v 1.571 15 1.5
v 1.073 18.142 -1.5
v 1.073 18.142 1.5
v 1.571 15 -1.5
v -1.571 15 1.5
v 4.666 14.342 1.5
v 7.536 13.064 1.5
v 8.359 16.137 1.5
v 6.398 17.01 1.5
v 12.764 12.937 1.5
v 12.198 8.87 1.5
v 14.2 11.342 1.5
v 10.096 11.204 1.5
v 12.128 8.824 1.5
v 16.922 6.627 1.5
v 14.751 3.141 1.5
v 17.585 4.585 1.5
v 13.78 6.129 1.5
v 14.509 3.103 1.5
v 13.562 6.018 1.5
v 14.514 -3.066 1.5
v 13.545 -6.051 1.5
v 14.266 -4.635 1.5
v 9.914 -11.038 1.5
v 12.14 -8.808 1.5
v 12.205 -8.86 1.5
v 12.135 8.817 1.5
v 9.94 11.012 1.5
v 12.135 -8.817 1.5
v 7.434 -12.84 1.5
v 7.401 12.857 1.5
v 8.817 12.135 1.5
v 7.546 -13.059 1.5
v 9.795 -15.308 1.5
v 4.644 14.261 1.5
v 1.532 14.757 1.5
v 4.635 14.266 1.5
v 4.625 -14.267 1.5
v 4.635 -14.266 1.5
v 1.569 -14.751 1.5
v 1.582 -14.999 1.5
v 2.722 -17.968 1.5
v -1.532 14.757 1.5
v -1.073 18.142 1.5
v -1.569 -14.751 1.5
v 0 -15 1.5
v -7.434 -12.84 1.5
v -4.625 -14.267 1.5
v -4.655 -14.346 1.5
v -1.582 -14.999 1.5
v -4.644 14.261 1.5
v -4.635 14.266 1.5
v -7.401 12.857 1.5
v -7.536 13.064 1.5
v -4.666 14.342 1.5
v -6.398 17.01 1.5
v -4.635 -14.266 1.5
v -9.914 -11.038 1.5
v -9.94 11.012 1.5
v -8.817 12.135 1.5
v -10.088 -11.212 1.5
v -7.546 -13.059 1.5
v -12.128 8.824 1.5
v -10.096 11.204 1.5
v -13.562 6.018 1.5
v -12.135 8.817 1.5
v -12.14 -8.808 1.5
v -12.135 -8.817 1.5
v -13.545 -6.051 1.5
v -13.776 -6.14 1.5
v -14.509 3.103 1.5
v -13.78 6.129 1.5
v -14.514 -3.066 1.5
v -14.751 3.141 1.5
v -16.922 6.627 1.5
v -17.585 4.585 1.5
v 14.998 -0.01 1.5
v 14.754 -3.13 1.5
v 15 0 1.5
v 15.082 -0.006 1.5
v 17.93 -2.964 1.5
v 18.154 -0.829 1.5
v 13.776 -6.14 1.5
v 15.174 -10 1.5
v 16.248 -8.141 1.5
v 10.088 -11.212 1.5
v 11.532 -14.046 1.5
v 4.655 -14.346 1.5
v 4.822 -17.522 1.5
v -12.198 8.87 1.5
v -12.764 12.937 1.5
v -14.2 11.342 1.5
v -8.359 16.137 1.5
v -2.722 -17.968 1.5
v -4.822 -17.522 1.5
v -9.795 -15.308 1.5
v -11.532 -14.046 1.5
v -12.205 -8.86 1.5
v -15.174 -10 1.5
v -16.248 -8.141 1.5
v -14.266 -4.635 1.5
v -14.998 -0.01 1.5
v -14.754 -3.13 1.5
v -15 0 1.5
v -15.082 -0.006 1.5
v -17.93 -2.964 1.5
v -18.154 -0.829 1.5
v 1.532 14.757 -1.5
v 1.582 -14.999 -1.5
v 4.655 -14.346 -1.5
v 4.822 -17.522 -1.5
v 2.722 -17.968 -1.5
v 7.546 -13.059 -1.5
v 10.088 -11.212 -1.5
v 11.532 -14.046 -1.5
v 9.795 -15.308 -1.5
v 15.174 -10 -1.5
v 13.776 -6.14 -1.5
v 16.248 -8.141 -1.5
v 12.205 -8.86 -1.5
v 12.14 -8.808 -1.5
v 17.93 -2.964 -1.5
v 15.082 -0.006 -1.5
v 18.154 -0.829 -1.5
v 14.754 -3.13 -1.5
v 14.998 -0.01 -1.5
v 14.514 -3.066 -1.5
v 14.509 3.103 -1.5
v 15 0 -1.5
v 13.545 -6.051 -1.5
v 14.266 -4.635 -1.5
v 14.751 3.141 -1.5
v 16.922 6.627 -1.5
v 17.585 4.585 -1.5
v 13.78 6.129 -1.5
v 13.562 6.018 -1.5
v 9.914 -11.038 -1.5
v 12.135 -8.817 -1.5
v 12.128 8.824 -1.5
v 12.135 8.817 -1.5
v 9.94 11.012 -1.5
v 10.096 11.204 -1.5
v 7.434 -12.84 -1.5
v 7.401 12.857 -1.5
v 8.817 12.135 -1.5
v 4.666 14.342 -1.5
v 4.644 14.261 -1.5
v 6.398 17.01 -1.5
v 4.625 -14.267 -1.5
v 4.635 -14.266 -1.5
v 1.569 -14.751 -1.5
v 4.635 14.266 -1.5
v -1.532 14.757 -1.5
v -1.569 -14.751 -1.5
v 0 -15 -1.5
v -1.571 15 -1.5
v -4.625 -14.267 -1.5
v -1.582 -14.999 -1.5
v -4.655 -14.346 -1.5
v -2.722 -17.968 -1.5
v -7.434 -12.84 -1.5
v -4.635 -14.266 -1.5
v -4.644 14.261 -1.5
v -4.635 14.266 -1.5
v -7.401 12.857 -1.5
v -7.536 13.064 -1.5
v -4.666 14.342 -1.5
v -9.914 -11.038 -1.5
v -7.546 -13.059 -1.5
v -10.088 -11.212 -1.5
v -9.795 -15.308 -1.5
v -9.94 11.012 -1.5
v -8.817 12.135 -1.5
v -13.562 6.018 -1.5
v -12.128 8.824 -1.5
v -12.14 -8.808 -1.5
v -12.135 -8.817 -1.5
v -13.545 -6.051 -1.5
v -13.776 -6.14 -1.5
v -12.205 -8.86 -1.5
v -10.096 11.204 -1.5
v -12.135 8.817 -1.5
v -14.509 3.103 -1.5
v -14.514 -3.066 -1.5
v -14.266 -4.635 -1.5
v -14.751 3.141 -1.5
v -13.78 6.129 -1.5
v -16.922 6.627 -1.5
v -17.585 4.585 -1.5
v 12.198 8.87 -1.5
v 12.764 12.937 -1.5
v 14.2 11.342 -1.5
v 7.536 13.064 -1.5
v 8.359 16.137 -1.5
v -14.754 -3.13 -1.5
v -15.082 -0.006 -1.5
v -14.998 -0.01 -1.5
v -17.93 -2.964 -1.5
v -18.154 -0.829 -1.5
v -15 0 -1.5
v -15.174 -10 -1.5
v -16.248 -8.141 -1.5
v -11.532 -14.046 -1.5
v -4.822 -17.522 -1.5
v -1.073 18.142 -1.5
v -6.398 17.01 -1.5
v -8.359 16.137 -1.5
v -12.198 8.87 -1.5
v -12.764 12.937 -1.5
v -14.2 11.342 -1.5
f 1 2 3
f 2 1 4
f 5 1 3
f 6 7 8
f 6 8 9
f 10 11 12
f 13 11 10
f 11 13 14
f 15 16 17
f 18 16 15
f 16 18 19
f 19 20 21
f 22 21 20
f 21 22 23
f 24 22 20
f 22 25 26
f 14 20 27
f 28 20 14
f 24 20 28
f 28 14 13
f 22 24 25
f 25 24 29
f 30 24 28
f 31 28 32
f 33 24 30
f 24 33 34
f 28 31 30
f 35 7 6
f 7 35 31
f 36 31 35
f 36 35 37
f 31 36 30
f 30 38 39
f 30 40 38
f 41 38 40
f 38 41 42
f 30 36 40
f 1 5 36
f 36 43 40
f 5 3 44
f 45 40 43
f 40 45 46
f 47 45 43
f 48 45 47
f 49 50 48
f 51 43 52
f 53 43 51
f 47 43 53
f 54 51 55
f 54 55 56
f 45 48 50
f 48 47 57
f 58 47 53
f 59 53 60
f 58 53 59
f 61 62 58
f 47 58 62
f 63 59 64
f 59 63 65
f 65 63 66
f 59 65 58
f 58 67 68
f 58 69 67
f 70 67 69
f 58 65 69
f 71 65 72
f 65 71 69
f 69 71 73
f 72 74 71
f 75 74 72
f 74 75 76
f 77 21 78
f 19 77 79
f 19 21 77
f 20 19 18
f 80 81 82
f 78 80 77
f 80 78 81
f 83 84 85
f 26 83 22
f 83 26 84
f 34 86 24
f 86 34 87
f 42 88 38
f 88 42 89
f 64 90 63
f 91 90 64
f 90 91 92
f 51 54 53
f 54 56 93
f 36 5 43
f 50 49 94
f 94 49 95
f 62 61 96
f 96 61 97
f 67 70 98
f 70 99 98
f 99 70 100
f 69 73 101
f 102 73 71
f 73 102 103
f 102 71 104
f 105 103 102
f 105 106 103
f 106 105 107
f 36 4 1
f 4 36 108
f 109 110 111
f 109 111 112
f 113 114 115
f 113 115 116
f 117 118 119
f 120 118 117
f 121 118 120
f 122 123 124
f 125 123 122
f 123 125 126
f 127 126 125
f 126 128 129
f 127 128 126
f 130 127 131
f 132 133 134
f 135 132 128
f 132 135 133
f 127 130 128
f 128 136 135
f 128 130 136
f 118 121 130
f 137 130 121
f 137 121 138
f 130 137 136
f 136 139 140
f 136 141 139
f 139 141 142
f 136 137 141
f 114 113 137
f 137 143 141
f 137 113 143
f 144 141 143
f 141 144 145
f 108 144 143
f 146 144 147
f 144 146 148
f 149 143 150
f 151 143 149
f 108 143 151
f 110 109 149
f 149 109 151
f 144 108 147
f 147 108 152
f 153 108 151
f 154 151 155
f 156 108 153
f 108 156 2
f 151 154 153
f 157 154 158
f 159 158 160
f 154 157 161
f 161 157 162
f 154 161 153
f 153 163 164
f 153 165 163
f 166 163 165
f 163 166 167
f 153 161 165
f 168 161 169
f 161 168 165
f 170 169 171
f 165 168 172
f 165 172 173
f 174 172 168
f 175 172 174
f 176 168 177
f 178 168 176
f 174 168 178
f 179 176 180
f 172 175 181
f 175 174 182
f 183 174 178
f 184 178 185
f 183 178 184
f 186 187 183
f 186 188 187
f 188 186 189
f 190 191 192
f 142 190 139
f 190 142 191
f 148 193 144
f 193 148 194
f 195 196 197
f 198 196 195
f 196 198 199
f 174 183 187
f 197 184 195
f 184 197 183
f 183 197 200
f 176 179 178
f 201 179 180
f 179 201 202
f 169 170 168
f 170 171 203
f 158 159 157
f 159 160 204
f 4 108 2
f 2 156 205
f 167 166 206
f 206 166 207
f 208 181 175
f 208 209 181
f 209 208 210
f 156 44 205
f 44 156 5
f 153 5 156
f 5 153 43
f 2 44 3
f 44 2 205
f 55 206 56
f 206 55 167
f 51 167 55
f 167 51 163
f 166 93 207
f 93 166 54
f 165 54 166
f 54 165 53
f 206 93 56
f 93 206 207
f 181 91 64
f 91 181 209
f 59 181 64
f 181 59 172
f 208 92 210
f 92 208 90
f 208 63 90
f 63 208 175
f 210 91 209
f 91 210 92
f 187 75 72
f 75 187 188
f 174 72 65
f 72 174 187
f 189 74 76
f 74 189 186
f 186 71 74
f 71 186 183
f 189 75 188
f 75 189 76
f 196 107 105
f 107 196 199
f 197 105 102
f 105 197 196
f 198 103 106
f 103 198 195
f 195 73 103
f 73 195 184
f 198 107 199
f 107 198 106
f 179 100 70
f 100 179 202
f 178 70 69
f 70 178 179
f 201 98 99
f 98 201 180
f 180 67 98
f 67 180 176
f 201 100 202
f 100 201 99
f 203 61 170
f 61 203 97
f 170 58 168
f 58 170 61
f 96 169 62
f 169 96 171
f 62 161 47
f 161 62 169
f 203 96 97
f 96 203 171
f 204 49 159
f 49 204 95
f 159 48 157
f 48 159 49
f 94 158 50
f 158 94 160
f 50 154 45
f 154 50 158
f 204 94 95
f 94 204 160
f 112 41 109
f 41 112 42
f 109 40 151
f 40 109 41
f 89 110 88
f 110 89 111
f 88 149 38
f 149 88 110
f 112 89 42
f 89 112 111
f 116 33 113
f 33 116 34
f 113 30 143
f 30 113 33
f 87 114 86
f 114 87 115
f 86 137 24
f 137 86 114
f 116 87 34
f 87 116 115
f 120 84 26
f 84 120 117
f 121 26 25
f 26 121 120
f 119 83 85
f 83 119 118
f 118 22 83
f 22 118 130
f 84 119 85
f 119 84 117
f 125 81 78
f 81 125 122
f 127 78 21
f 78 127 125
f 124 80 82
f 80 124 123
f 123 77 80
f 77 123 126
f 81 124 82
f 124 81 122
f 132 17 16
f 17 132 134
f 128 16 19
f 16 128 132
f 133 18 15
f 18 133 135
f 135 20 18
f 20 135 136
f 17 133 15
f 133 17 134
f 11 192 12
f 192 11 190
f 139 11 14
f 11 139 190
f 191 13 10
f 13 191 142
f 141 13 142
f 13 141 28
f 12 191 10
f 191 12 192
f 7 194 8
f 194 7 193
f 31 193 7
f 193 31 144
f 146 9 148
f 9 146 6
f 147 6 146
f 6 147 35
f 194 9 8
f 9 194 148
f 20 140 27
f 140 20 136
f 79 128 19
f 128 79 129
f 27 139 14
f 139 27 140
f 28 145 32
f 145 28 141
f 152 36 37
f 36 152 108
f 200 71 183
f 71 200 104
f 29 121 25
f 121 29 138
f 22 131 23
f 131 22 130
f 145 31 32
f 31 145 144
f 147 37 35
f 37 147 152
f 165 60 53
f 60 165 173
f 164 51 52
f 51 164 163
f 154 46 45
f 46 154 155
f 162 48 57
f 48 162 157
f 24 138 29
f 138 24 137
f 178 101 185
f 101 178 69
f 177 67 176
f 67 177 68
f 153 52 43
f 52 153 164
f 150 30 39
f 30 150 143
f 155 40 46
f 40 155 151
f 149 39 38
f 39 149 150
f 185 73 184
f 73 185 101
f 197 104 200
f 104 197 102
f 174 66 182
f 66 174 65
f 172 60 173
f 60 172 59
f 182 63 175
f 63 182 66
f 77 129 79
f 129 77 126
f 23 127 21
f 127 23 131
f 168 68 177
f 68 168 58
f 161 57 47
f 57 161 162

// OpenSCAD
// Helical Gears
// Catarina Mota
// catarinamfmota@gmail.com
// 20091123


//GEAR PARAMETERS
doubleHelical=1; //int: 0=no, 1=yes (will make the gear 2x taller)

gearHeight=5; //gear depth

pitchDiam=45; //pitch diameter

shaftDiam=5; //shaft diameter

//TEETH PARAMETERS
teethNum=10; //number of teeth (int)

addendum=2;
$fn = 20;

gearRadius = 15;
gearThickness = 3;
toothCount = 15;

spurGearApproximation(gearRadius, gearThickness, toothCount);

module spurGearApproximation(gearRadius, gearThickness, toothCount){
    echo("Usage: spurGearApproximation(gearRadius, gearThickness, toothCount);");
    echo("Example: spurGearApproximation(10,3,20);");
    circumference = 2*3.14159*gearRadius;
    toothWidth = circumference  / 2 / toothCount;
    toothLength = 2*toothWidth;
    for(i = [0:360/toothCount:360-(360/toothCount)]){
        spurTooth(toothWidth, toothLength, gearThickness, gearRadius, i);
    }
    cylinder(gearThickness, gearRadius, gearRadius, center = true);
}

module spurTooth(toothWidth, toothLength, toothDepth, gearRadius, rotation){
    rotate([0,0,rotation]){
        translate([0,gearRadius,0]){
            intersection(){
                translate([-(gearRadius-toothWidth/2), 0, 0]){
                    cylinder(toothDepth, gearRadius, gearRadius, center = true);
                }
                translate([(gearRadius-toothWidth/2), 0, 0]){
                    cylinder(toothDepth, gearRadius, gearRadius, center = true);
                }
                translate([0, 0, 0]){
                    cube([toothWidth, toothLength/1, toothDepth], center = true);
                }
            }
        }
    }
}
